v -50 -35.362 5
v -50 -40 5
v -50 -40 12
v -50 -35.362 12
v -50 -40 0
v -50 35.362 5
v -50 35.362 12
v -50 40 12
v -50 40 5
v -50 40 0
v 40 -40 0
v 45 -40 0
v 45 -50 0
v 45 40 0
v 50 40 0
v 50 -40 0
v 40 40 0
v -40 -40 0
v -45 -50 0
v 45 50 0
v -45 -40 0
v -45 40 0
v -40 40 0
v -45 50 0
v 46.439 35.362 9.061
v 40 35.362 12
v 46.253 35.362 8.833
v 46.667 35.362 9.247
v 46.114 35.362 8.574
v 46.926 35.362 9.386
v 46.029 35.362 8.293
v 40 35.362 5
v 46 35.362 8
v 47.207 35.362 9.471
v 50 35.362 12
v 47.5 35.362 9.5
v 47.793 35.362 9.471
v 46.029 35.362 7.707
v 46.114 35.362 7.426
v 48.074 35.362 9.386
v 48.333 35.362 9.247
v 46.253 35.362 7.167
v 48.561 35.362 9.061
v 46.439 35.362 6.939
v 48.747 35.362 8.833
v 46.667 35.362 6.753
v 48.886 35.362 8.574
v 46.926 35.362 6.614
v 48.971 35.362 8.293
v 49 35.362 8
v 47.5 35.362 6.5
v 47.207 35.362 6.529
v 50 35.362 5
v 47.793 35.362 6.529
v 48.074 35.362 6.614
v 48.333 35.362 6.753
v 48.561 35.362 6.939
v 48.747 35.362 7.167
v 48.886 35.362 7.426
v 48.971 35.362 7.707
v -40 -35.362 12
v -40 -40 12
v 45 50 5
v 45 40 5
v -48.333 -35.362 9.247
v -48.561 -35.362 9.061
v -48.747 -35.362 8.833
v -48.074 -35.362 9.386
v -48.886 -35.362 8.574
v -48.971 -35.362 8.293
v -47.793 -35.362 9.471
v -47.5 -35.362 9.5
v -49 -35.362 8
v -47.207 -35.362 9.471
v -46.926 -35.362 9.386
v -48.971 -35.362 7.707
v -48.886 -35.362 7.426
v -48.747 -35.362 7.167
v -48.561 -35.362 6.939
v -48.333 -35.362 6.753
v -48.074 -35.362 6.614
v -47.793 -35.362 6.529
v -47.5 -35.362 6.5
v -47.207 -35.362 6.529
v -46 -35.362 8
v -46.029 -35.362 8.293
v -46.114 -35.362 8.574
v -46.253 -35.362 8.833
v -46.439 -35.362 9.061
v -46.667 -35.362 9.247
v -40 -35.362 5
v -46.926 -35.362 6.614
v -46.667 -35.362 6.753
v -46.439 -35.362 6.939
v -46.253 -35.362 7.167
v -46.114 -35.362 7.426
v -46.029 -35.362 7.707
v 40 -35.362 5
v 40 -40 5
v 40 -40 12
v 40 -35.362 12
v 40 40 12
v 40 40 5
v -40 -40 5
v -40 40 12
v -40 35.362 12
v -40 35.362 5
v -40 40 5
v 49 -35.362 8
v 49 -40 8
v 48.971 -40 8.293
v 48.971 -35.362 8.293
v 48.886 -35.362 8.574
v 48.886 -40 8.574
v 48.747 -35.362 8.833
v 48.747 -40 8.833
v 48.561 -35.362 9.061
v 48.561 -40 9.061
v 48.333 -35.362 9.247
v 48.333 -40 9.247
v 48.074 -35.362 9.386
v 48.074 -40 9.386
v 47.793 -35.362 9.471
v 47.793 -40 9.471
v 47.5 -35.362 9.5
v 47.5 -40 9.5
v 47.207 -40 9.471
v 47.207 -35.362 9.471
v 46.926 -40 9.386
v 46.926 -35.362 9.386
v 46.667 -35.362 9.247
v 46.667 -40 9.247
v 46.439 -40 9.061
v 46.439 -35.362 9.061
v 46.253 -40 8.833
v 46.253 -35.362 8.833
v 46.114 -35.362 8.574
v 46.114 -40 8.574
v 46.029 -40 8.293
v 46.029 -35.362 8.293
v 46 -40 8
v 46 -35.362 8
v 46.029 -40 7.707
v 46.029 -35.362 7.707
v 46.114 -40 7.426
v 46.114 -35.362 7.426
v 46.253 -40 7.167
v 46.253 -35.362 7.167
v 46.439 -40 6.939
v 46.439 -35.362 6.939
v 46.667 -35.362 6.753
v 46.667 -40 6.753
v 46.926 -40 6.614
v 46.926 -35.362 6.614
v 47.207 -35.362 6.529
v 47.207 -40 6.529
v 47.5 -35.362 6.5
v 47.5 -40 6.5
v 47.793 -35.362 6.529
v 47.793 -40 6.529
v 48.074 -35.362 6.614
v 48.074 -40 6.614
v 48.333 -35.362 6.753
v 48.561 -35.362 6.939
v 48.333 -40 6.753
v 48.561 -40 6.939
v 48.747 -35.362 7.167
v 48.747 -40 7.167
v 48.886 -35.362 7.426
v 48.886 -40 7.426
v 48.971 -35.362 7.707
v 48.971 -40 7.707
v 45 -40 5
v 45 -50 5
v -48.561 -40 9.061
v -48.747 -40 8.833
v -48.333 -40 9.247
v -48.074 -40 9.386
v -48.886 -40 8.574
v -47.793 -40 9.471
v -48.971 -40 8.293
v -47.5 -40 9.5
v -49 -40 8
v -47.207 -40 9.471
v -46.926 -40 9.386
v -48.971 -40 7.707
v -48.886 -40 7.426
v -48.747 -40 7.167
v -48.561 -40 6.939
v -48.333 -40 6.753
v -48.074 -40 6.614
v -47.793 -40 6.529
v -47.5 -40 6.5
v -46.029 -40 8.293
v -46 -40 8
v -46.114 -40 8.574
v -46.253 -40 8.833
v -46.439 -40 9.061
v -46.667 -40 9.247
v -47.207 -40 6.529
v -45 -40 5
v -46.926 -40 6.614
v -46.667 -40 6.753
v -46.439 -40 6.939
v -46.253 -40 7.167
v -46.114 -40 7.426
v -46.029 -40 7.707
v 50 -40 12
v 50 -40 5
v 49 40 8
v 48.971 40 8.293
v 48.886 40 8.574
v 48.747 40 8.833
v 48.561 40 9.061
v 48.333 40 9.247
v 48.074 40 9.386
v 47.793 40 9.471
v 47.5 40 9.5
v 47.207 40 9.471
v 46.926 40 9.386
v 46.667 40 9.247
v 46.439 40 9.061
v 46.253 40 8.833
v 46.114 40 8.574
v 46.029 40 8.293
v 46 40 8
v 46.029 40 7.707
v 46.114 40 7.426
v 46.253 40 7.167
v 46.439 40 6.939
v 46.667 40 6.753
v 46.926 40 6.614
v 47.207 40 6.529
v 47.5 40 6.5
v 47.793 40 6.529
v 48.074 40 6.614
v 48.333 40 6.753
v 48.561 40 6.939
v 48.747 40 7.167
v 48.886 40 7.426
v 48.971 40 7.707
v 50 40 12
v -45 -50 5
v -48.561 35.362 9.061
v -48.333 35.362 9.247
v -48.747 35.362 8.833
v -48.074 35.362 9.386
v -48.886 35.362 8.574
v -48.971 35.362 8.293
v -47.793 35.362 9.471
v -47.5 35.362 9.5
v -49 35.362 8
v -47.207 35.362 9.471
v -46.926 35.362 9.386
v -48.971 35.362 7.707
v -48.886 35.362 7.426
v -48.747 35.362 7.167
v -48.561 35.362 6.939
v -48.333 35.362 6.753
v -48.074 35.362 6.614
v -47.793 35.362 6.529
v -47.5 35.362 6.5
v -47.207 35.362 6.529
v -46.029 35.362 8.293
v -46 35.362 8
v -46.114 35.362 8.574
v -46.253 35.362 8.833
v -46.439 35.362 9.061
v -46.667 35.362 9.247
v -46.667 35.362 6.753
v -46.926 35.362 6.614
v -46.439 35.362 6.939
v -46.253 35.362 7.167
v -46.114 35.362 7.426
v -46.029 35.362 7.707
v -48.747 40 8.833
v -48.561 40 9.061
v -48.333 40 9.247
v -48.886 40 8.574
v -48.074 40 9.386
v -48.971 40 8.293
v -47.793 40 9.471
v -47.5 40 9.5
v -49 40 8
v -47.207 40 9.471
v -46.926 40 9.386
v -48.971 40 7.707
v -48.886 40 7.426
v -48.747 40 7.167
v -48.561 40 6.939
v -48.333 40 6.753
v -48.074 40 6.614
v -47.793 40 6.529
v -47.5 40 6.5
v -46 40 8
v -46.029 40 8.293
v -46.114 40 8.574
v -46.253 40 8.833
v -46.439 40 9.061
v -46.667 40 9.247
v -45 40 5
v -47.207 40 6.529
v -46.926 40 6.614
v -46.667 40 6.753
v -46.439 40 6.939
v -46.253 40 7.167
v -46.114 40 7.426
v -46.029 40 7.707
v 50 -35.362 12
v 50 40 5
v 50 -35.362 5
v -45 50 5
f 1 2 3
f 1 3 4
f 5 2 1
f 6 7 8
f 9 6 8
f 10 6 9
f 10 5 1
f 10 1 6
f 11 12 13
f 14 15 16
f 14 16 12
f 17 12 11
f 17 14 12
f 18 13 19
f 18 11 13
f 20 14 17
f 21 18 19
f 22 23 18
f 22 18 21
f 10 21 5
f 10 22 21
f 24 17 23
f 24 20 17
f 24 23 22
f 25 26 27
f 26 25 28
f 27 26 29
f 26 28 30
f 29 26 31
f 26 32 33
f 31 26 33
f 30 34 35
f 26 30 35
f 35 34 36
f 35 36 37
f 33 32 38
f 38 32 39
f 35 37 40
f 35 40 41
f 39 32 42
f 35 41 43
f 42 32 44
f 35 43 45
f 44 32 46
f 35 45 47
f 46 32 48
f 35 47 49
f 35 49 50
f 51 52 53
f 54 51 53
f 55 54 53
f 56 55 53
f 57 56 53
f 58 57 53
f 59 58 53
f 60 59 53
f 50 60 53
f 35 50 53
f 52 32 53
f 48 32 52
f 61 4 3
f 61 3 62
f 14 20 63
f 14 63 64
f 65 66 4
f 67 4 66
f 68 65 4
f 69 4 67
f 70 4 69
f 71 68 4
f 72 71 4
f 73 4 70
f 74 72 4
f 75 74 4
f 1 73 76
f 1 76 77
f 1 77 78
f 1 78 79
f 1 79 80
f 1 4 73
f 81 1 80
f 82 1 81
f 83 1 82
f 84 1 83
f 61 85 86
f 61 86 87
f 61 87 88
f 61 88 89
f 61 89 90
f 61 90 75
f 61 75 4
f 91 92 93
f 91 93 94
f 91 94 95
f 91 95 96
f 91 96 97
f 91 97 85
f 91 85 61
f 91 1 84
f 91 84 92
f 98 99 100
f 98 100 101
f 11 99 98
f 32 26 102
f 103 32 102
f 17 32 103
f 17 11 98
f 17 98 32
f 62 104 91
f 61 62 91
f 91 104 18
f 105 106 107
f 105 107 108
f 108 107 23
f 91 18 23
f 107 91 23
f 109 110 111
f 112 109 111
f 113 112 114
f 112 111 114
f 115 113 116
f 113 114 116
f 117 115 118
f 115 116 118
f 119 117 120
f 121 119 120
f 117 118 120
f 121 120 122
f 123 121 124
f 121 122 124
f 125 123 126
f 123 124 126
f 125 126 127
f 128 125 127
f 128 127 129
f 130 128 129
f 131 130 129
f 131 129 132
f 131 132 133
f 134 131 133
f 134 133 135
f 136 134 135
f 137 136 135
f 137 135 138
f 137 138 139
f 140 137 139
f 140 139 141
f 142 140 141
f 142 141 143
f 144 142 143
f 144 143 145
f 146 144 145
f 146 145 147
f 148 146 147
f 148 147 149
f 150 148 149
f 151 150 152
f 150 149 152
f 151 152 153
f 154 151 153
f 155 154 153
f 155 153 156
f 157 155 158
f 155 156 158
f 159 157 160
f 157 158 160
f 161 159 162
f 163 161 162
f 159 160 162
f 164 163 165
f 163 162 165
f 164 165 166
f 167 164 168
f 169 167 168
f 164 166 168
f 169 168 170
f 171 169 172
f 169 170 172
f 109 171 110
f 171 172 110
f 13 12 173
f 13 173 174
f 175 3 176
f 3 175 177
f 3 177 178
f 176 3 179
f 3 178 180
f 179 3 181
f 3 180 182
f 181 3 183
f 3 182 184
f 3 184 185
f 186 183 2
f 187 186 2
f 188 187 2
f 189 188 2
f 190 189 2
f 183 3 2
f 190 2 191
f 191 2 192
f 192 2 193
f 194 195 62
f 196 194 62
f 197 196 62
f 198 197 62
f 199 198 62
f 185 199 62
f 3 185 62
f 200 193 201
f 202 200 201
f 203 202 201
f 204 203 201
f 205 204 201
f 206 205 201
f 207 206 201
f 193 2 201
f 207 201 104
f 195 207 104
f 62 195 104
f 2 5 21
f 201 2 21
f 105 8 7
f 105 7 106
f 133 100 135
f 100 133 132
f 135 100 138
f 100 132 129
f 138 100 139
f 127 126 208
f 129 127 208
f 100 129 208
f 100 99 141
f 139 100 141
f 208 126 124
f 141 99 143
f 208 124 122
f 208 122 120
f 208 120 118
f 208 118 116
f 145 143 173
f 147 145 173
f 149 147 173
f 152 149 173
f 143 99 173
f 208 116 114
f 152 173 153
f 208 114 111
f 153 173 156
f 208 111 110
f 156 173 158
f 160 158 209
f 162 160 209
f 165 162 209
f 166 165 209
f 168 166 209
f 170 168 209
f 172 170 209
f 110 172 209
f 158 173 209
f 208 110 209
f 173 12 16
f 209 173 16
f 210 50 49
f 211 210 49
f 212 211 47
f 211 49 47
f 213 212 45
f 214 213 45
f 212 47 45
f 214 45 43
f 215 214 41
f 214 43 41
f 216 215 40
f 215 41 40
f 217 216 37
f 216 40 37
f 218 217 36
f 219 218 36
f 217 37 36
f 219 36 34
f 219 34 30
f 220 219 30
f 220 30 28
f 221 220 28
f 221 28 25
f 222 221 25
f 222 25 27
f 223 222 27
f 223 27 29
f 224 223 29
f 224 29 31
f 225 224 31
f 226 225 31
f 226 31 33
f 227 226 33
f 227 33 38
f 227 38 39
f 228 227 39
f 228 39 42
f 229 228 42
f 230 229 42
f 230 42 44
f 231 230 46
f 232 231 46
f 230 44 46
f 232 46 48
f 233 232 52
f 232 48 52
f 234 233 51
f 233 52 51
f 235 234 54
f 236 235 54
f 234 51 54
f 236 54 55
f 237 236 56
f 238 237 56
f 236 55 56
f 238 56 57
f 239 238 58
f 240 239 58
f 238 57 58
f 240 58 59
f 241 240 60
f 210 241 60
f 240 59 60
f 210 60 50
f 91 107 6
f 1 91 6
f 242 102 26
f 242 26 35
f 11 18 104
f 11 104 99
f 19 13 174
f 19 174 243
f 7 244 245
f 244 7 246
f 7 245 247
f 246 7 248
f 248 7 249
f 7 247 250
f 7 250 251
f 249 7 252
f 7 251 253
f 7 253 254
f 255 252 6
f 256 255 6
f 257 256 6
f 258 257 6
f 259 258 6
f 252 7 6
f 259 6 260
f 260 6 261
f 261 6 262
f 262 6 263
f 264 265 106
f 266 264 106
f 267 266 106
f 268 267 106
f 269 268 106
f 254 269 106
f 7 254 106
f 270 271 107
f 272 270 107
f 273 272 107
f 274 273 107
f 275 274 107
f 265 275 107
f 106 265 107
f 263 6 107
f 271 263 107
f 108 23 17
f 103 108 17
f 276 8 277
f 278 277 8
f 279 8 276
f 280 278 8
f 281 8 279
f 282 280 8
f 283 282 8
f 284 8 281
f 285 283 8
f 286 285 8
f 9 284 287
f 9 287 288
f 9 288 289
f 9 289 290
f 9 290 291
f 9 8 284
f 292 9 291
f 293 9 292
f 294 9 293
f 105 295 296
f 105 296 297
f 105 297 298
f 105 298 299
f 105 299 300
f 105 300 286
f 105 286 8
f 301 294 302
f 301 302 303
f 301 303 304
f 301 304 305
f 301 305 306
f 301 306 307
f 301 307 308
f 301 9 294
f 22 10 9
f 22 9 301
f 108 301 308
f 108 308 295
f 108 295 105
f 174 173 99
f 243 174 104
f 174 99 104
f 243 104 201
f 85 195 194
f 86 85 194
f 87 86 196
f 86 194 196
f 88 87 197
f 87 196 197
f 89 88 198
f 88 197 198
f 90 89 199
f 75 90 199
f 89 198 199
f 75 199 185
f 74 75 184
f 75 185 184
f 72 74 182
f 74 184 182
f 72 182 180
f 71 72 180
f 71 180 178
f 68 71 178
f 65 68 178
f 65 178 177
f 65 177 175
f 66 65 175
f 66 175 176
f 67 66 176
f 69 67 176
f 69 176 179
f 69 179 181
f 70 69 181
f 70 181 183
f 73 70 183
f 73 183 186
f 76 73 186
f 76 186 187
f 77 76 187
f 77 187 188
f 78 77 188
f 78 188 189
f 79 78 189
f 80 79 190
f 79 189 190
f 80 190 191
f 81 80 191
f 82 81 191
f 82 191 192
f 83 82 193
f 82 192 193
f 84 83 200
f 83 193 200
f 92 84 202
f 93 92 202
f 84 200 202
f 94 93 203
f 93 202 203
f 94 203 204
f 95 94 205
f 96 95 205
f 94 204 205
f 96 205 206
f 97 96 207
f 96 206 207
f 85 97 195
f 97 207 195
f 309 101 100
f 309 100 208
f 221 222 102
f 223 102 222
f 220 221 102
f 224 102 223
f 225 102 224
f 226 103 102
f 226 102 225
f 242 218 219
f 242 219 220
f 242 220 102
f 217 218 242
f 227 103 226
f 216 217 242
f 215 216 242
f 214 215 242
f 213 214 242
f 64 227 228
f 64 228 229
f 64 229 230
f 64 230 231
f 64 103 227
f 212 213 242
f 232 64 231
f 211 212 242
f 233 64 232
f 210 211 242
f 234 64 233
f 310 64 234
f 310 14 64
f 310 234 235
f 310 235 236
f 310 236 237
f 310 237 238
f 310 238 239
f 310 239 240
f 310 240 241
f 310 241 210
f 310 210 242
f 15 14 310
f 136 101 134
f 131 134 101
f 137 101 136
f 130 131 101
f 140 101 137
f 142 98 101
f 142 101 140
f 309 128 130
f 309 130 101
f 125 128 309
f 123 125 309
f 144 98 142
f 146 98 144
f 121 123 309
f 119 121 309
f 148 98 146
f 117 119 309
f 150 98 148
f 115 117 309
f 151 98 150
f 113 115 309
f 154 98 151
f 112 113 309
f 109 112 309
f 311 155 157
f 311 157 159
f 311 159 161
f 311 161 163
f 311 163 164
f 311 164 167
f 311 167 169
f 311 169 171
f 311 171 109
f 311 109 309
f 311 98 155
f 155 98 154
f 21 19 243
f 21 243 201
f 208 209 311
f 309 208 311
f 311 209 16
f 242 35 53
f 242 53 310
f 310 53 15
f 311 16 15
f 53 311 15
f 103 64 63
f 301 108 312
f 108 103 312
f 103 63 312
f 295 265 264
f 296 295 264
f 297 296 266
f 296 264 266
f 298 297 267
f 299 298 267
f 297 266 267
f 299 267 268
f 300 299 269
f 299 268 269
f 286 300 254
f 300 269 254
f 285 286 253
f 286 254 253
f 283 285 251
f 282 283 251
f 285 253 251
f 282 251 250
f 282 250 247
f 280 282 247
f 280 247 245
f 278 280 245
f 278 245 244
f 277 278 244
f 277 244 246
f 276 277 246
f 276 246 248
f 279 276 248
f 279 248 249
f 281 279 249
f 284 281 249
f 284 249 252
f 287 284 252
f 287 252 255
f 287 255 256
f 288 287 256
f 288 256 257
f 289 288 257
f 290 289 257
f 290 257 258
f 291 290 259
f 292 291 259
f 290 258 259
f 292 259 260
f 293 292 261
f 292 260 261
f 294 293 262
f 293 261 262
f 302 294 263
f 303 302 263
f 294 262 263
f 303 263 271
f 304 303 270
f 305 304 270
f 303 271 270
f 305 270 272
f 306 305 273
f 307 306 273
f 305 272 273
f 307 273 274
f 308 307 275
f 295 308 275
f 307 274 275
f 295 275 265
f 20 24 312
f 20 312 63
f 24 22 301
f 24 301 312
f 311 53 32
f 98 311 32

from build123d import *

# Parameters (mm, degrees)
SKETCH1_W           = 80
SKETCH1_H           = 80
BOSS_EXTRUDE1_DEPTH = 5
SKETCH2_W           = 10
SKETCH2_H           = 4.637634929
BOSS_EXTRUDE2_DEPTH = 7
SKETCH3_R           = 1.5
CUT_EXTRUDE1_DEPTH  = 91


with BuildPart() as part:
    # Sketch1 → Boss-Extrude1 (new body)
    with BuildSketch(Plane.XY):
        Polygon((-50, 40), (-45, 40), (-45, 50), (45, 50), (45, 40), (50, 40), (50, -40), (45, -40), (45, -50), (-45, -50), (-45, -40), (-50, -40), align=None)
        Rectangle(SKETCH1_W, SKETCH1_H, mode=Mode.SUBTRACT)
    extrude(amount=BOSS_EXTRUDE1_DEPTH)

    # Sketch2 → Boss-Extrude2 (add)
    with BuildSketch(Plane.XY.offset(5)):
        with Locations((45, -37.681182535)):
            Rectangle(SKETCH2_W, SKETCH2_H)
        with Locations((-45, -37.681182535)):
            Rectangle(SKETCH2_W, SKETCH2_H)
        with Locations((-45, 37.681182535)):
            Rectangle(SKETCH2_W, SKETCH2_H)
        with Locations((45, 37.681182535)):
            Rectangle(SKETCH2_W, SKETCH2_H)
    extrude(amount=BOSS_EXTRUDE2_DEPTH)

    # Sketch3 → Cut-Extrude1 (cut, through all)
    with BuildSketch(Plane.XZ.offset(40)):
        with Locations((-47.5, 8)):
            Circle(SKETCH3_R)
        with Locations((47.5, 8)):
            Circle(SKETCH3_R)
    extrude(amount=-CUT_EXTRUDE1_DEPTH, mode=Mode.SUBTRACT)


solid = part.part
